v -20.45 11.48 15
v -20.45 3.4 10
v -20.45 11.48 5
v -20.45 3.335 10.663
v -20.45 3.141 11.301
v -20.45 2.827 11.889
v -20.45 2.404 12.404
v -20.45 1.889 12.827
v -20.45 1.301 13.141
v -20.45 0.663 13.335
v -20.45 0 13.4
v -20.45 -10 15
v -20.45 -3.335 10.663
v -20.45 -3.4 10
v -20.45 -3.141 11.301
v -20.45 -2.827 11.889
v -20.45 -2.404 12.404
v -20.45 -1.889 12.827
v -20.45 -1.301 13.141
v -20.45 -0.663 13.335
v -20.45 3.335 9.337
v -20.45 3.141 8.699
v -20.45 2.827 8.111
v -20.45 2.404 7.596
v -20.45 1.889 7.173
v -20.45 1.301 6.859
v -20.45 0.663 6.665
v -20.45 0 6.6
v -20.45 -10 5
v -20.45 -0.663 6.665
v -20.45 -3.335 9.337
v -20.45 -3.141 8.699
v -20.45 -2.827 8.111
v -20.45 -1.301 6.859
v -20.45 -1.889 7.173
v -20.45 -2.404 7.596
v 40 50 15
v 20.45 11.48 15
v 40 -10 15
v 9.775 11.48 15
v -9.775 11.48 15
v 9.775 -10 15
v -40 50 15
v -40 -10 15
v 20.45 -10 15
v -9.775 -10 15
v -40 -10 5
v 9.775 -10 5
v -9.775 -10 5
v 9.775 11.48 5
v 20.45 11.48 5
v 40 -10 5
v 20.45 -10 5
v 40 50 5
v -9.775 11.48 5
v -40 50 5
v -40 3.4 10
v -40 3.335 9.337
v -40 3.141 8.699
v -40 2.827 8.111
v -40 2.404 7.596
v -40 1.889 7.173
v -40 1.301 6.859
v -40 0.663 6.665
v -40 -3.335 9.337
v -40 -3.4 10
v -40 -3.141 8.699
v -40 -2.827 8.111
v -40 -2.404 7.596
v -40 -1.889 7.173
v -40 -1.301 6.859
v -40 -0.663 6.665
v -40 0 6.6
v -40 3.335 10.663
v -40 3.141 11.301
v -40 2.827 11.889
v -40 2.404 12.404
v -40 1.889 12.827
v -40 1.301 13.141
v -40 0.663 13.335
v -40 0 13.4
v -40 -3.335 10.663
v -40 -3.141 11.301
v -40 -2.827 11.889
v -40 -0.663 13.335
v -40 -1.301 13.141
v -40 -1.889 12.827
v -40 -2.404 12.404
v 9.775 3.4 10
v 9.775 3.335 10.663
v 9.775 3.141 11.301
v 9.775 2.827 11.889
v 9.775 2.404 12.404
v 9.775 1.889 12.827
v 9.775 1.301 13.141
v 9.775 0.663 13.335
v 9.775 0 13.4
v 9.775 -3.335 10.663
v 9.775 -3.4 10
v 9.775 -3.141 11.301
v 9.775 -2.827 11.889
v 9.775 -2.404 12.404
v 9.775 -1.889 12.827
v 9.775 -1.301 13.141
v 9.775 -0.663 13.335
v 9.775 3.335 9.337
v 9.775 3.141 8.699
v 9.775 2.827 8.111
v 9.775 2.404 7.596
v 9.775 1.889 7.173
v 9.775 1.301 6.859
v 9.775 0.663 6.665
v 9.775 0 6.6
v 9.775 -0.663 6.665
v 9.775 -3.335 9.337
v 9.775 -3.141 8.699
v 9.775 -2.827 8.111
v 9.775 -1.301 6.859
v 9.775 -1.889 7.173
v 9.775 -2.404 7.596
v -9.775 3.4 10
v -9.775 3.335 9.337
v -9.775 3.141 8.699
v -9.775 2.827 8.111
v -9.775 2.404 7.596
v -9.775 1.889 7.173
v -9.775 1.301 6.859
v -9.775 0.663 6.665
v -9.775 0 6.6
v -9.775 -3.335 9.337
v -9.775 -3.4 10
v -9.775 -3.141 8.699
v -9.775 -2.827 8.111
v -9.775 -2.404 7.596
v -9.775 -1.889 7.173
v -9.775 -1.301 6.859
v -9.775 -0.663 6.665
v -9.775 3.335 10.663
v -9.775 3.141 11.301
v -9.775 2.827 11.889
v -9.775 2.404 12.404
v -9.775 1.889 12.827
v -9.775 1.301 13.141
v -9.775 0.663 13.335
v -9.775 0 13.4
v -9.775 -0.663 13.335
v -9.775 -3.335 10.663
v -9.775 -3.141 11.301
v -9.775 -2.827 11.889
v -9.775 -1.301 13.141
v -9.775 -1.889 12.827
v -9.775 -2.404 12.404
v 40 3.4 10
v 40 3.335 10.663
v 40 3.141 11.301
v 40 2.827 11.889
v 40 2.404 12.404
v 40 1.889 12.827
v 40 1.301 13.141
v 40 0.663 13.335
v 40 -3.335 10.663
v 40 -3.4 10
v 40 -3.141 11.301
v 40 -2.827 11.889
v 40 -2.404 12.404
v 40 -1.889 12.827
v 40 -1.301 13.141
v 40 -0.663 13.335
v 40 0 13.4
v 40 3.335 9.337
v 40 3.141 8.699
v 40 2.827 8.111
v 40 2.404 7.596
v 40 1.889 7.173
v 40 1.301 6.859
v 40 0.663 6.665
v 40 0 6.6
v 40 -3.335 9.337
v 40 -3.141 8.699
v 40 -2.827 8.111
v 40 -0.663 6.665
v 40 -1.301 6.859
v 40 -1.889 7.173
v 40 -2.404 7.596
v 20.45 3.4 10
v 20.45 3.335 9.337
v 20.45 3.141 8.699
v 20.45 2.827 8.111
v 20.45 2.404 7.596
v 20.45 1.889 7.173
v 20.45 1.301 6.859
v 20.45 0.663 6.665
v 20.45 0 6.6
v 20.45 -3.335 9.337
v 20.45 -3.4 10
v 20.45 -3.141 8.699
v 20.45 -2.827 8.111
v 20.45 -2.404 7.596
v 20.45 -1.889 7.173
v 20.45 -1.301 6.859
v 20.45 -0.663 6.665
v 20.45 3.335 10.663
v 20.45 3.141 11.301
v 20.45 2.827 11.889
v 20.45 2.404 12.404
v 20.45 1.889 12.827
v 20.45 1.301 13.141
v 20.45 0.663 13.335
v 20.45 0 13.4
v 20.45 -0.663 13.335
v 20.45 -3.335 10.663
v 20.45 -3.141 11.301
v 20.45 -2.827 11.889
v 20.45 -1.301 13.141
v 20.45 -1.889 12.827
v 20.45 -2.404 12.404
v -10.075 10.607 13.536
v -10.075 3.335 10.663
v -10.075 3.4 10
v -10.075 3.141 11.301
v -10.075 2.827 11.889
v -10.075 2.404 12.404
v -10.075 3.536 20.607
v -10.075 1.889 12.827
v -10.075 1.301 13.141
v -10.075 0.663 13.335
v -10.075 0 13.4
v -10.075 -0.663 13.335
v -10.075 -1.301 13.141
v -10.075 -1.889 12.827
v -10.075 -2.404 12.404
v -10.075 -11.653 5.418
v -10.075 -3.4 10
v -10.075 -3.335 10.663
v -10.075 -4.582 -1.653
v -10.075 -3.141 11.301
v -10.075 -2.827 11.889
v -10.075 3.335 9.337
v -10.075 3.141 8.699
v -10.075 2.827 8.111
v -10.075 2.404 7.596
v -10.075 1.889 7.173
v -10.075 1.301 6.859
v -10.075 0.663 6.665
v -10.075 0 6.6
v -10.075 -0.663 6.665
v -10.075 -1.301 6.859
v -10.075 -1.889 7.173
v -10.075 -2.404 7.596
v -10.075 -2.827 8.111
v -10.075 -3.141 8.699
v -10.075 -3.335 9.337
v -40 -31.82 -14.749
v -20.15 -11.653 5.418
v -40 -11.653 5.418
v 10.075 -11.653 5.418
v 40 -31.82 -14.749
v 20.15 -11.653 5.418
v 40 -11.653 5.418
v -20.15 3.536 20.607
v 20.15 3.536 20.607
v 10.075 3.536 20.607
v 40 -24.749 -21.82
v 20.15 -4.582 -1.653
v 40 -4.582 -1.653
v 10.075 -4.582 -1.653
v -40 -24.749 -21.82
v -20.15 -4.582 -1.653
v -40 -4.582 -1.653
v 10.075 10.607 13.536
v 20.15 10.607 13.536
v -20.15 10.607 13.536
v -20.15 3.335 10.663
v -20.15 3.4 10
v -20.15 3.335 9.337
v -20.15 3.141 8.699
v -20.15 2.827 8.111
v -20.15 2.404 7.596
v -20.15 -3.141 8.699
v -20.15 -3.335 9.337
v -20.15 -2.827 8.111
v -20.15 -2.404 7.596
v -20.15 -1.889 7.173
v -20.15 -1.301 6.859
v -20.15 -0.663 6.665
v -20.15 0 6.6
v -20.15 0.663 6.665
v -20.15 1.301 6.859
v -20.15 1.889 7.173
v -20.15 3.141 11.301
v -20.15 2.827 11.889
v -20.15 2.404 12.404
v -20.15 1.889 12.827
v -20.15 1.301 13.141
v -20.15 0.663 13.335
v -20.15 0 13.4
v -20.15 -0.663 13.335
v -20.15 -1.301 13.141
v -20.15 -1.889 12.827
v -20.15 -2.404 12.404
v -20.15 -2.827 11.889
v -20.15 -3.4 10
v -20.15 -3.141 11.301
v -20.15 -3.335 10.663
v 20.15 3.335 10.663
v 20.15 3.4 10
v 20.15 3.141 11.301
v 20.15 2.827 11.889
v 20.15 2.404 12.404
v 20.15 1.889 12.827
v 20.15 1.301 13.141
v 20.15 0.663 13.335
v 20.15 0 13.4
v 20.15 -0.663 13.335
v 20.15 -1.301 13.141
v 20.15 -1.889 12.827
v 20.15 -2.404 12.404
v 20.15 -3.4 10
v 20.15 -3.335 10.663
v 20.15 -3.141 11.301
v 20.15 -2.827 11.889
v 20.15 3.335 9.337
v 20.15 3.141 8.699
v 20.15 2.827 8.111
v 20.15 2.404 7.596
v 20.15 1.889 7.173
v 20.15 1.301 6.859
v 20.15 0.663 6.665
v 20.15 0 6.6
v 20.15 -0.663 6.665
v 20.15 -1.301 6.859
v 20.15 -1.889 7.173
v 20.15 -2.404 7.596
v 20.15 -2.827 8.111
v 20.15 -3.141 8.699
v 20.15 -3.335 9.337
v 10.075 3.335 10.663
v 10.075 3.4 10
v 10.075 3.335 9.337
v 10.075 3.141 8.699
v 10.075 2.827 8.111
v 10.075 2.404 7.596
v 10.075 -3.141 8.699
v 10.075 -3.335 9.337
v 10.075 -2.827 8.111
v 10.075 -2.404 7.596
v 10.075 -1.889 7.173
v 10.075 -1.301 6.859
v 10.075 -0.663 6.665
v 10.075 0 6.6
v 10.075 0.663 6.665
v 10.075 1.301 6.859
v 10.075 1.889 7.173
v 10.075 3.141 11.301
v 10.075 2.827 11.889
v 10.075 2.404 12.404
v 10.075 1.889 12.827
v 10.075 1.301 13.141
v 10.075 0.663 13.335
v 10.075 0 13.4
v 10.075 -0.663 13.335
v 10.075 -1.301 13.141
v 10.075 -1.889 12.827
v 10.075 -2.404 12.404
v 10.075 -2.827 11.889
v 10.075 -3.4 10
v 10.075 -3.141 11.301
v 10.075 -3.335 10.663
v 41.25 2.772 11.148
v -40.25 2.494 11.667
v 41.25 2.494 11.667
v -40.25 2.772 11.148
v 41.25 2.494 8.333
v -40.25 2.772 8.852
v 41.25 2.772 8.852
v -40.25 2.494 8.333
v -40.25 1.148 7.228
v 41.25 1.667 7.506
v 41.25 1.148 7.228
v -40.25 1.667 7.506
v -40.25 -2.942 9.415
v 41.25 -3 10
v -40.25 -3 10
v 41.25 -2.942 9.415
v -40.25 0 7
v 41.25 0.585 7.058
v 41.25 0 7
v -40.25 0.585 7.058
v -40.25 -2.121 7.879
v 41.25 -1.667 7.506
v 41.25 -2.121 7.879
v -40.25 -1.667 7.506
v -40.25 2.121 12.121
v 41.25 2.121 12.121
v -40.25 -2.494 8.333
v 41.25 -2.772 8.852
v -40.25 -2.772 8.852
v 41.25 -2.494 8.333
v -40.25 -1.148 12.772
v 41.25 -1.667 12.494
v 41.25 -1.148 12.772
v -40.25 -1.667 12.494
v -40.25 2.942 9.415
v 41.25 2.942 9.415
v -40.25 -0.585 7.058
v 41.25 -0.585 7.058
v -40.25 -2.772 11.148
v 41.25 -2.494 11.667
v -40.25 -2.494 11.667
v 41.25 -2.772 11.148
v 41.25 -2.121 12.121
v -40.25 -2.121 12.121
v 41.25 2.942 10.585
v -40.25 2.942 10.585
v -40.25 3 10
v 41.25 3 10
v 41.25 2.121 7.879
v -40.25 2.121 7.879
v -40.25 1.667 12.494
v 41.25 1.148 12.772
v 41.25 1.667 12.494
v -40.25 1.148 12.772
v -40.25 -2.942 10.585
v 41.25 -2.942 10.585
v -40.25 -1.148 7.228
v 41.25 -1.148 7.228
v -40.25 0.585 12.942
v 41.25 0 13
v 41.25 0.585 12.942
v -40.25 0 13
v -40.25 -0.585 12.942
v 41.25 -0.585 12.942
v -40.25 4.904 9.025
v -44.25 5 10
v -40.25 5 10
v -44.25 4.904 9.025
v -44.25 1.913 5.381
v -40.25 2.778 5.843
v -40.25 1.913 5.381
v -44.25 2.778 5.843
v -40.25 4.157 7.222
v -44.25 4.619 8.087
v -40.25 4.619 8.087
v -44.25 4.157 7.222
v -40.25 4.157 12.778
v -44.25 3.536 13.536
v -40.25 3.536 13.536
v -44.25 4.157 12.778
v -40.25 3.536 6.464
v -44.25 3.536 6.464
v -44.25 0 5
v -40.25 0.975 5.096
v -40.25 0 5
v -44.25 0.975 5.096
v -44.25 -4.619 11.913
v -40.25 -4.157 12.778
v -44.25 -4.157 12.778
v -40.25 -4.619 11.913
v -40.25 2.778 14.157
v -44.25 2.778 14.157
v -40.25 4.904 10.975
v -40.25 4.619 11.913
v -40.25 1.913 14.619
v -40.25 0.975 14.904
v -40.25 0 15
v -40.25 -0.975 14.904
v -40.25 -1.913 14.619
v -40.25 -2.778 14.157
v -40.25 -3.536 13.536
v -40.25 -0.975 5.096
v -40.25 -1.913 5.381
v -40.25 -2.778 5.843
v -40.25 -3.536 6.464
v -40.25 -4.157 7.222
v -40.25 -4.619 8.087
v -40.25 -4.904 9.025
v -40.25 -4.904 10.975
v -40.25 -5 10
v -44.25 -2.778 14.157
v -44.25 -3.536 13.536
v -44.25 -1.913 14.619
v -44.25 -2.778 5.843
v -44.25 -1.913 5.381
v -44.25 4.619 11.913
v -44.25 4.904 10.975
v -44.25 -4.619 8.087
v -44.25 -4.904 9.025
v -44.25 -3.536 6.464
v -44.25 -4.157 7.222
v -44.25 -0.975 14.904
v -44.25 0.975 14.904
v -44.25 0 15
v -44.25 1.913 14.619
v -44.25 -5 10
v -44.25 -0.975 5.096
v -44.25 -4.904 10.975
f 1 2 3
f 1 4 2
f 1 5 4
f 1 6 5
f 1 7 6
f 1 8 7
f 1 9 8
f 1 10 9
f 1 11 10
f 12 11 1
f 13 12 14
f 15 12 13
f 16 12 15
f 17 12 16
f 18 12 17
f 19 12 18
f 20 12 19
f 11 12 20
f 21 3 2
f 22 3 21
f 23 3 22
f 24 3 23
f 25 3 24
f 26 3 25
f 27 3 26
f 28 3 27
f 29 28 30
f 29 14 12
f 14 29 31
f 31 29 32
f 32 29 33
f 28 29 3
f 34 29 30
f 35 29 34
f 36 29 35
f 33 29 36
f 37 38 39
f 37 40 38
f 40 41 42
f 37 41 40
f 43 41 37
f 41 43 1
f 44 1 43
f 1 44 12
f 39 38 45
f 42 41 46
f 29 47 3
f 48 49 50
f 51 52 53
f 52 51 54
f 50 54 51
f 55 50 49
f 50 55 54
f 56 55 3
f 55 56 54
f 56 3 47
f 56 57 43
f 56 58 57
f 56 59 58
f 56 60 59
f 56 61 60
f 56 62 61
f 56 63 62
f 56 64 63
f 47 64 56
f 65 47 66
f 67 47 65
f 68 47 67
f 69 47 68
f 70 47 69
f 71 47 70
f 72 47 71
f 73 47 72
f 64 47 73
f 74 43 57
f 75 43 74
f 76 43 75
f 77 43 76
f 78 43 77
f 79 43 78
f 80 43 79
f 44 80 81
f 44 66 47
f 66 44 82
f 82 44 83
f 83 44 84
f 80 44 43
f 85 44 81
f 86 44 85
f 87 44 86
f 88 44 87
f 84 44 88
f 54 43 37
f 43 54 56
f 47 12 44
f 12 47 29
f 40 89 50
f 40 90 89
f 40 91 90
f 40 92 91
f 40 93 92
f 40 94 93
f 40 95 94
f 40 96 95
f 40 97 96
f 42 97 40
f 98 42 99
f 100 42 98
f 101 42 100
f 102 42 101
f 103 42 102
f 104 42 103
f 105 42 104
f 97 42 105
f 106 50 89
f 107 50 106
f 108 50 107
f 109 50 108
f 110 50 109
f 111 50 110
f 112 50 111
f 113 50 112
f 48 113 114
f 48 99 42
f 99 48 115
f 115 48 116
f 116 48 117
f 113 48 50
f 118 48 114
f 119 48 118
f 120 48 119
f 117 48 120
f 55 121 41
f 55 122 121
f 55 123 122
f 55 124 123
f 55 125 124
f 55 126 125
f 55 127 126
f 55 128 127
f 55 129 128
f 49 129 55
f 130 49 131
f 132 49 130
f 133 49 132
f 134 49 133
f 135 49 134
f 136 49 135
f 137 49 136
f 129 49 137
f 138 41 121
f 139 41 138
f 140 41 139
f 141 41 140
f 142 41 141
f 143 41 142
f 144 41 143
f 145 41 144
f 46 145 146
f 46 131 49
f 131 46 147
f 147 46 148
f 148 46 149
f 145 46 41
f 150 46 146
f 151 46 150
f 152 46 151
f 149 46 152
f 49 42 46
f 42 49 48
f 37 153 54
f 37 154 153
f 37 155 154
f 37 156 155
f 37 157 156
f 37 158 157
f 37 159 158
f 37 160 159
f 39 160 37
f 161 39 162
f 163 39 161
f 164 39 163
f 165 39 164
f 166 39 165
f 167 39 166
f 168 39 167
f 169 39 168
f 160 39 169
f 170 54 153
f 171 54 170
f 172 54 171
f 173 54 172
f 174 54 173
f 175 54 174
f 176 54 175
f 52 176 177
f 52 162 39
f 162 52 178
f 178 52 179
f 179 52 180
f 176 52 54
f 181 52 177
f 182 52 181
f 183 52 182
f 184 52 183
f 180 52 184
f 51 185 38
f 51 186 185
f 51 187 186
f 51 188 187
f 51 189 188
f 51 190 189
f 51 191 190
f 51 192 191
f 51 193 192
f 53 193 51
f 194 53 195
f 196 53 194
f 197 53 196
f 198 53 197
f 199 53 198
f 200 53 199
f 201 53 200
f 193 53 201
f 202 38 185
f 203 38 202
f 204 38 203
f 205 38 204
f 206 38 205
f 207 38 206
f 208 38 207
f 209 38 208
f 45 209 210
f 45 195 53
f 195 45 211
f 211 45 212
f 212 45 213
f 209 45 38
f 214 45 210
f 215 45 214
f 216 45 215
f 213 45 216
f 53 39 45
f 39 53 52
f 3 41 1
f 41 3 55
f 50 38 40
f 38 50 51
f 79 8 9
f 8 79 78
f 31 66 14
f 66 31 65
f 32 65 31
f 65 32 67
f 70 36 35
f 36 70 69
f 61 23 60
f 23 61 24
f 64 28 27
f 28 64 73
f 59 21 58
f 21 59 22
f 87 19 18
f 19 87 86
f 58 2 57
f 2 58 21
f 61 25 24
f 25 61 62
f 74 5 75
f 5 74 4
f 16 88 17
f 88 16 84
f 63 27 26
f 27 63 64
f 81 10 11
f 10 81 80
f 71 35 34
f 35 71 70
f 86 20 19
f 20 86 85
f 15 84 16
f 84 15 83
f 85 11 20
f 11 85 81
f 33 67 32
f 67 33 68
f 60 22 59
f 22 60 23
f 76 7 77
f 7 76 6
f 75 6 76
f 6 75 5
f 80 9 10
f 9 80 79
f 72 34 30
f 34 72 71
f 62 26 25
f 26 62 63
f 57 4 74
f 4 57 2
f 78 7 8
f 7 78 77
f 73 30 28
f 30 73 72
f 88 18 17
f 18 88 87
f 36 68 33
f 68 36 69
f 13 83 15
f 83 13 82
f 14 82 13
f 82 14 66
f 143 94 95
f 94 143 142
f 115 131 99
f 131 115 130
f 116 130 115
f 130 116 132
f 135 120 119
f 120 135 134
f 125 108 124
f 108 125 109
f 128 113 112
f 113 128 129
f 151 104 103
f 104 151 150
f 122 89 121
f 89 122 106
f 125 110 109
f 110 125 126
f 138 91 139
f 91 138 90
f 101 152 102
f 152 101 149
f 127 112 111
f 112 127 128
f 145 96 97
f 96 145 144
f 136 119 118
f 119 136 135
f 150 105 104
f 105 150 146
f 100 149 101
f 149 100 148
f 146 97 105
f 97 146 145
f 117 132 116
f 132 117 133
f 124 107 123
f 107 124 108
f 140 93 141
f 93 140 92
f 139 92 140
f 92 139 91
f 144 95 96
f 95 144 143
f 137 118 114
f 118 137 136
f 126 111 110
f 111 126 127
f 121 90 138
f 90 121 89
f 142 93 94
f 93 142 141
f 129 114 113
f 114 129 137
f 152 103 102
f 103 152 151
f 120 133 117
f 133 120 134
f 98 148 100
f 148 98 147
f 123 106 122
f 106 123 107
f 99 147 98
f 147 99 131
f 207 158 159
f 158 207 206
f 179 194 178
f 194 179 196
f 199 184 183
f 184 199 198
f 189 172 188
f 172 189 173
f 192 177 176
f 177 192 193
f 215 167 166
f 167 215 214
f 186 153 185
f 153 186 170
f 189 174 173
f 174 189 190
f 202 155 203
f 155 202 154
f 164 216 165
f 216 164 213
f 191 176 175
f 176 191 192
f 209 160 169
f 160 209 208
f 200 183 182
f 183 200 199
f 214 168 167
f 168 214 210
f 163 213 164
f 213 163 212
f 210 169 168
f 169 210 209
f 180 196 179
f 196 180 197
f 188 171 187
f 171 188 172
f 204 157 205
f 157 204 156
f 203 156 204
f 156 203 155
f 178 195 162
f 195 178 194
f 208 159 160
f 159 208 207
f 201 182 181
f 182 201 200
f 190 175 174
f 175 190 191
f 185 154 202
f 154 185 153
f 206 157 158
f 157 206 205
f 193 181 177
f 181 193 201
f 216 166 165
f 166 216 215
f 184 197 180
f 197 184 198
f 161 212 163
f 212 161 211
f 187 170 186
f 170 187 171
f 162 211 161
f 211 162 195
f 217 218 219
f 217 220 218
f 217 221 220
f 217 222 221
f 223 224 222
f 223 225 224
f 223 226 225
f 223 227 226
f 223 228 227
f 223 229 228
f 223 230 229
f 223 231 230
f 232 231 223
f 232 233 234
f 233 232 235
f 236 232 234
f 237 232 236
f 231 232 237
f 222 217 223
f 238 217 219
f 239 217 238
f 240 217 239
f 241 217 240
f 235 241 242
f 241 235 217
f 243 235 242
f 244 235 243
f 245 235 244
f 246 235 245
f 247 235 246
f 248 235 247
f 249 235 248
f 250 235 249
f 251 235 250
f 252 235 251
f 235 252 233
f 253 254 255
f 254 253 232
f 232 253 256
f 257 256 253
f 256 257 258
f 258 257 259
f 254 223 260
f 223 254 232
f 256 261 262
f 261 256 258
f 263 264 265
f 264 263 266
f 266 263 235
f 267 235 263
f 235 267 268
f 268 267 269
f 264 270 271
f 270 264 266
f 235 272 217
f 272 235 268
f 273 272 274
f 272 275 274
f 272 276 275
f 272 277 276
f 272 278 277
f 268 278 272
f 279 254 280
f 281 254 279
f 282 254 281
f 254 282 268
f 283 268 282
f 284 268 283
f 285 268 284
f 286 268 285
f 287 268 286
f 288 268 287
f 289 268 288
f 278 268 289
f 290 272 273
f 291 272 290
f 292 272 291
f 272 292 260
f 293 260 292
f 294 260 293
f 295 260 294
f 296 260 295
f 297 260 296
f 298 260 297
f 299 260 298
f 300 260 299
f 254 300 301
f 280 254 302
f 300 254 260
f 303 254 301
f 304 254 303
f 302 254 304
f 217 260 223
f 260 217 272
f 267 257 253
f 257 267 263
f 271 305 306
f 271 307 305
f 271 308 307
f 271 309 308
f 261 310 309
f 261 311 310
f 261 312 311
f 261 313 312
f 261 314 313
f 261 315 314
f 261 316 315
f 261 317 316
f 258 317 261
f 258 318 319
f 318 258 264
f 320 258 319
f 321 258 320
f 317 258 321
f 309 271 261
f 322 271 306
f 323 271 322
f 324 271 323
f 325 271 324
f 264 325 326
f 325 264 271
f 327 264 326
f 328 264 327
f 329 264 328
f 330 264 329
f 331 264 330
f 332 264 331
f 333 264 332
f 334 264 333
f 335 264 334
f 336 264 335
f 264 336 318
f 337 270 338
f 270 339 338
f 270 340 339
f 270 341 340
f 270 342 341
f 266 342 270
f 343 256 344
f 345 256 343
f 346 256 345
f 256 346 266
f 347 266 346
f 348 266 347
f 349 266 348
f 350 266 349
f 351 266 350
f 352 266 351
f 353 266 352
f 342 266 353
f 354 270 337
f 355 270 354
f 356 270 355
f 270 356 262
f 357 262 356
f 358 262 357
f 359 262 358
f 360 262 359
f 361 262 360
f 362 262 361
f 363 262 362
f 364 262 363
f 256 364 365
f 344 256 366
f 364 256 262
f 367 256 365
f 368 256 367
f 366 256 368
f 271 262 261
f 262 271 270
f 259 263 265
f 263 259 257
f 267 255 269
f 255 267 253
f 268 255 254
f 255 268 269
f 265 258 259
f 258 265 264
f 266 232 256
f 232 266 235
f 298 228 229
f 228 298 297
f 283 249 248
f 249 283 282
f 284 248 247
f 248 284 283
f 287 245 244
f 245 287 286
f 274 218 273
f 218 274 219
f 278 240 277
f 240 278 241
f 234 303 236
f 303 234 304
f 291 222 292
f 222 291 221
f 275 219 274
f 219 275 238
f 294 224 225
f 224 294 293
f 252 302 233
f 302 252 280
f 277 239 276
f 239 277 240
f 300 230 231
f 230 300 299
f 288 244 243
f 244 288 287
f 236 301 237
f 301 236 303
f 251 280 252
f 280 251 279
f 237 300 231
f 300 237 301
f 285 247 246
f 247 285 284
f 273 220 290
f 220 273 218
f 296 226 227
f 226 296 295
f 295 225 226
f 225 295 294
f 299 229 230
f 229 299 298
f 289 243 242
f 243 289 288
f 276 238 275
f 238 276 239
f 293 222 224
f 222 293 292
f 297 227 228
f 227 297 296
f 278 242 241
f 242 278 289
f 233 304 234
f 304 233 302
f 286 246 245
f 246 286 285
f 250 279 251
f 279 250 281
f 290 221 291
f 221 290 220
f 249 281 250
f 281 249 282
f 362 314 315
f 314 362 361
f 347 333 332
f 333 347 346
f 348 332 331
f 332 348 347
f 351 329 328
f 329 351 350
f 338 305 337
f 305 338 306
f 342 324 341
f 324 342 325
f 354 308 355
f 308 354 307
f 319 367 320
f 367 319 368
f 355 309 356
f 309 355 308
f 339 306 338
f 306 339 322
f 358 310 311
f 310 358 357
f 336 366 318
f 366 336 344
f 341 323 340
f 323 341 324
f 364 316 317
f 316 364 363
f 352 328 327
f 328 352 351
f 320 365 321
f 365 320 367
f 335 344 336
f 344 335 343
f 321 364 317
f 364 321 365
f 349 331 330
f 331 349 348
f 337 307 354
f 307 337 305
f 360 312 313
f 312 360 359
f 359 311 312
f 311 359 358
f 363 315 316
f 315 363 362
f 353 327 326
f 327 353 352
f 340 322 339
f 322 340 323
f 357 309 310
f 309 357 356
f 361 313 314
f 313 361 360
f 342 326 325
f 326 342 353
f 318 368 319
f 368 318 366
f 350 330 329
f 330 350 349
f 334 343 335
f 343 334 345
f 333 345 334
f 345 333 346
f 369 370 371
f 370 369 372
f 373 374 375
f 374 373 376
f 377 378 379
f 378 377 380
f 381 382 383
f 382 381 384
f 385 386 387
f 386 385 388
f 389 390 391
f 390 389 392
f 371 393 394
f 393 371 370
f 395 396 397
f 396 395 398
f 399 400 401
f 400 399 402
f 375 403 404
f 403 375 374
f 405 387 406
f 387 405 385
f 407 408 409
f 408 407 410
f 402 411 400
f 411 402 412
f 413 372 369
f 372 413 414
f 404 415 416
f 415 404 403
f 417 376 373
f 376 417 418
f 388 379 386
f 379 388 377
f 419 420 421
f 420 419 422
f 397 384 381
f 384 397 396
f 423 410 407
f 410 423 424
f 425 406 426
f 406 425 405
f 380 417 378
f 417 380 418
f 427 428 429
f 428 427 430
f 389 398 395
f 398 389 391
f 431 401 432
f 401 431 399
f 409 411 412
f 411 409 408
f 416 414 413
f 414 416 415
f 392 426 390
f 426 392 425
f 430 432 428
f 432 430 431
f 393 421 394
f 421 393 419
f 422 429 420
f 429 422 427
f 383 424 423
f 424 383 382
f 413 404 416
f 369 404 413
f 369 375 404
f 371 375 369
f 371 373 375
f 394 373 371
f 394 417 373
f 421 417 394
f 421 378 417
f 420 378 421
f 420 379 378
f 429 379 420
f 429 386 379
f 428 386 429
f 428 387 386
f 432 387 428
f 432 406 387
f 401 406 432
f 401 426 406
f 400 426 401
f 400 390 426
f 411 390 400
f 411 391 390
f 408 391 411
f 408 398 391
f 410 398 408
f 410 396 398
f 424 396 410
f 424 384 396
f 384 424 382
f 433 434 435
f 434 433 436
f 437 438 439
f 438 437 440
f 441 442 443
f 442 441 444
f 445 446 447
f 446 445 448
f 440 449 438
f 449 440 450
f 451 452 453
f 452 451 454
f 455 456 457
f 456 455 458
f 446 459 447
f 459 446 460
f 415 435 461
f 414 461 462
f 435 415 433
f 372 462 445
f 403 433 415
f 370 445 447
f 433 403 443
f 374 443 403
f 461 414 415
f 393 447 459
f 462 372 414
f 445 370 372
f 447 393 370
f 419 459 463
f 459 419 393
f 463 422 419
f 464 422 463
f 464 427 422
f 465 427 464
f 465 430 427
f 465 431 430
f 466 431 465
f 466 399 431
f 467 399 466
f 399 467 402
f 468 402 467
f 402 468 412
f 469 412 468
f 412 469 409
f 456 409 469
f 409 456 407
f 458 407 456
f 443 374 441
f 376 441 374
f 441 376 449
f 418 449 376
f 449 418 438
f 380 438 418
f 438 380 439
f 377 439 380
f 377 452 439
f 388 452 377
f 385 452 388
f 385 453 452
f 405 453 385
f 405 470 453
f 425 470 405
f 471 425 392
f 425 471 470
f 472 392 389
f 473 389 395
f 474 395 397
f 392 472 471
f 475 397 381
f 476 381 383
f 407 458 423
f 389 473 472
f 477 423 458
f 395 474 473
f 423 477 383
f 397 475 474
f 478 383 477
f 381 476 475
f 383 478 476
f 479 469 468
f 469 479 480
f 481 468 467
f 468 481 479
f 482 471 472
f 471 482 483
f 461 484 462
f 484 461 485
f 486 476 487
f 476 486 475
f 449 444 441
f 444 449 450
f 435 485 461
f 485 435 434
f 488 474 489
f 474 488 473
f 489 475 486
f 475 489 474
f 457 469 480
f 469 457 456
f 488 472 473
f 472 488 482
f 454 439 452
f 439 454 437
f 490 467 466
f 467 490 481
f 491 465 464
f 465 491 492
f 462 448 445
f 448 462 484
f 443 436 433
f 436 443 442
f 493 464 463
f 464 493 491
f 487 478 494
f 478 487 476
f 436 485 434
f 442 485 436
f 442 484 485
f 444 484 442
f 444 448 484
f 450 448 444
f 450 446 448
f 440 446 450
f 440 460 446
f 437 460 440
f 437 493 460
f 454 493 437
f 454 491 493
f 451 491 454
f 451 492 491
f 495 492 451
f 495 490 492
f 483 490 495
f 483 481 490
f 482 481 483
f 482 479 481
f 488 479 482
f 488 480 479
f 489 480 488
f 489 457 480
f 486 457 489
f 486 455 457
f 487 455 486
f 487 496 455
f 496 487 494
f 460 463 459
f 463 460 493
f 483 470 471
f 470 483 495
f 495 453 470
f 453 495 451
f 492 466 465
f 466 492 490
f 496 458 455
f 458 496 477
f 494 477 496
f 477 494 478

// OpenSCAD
$fn = 32;

// ------------------------------------------------------------------------
// Butt hinge: hinge 80 mm, leaf swung 45 deg
// Every part is its own module, assembly() places every instance.
// ------------------------------------------------------------------------

// --- part 1 ---
module hinge_base() {
  difference() {
    union() {
      translate([-40, -10, -5]) cube([19.55, 60, 10]);
      translate([-9.775, -10, -5]) cube([19.55, 60, 10]);
      translate([20.45, -10, -5]) cube([19.55, 60, 10]);
      translate([-40, 11.48, -5]) cube([80, 38.52, 10]);
    }
    translate([-30.225, 0, 0]) rotate([0, 90, 0]) cylinder(h = 21.55, d = 6.8, center = true);
    translate([0, 0, 0]) rotate([0, 90, 0]) cylinder(h = 21.55, d = 6.8, center = true);
    translate([30.225, 0, 0]) rotate([0, 90, 0]) cylinder(h = 21.55, d = 6.8, center = true);
  }
}

// --- part 2 ---
module hinge_mover() {
  difference() {
    union() {
      translate([-20.15, -40, -5]) cube([10.075, 50, 10]);
      translate([10.075, -40, -5]) cube([10.075, 50, 10]);
      translate([-40, -40, -5]) cube([80, 28.52, 10]);
    }
    translate([-15.113, 0, 0]) rotate([0, 90, 0]) cylinder(h = 12.075, d = 6.8, center = true);
    translate([15.113, 0, 0]) rotate([0, 90, 0]) cylinder(h = 12.075, d = 6.8, center = true);
  }
}

// --- part 3 ---
module hinge_pin() {
  rotate([0, 90, 0]) cylinder(h = 82.5, d = 6, center = true);
  translate([-44.25, 0, 0]) rotate([0, 90, 0]) cylinder(h = 4, d = 10);
}

// --- assembly ---
module assembly() {
  color([0.80, 0.24, 0.20]) translate([0, 0, 10]) rotate([0, 0, 0]) hinge_base();
  color([0.20, 0.45, 0.75]) translate([0, 0, 10]) rotate([45, 0, 0]) hinge_mover();
  color([0.25, 0.62, 0.32]) translate([0, 0, 10]) rotate([0, 0, 0]) hinge_pin();
}

assembly();
